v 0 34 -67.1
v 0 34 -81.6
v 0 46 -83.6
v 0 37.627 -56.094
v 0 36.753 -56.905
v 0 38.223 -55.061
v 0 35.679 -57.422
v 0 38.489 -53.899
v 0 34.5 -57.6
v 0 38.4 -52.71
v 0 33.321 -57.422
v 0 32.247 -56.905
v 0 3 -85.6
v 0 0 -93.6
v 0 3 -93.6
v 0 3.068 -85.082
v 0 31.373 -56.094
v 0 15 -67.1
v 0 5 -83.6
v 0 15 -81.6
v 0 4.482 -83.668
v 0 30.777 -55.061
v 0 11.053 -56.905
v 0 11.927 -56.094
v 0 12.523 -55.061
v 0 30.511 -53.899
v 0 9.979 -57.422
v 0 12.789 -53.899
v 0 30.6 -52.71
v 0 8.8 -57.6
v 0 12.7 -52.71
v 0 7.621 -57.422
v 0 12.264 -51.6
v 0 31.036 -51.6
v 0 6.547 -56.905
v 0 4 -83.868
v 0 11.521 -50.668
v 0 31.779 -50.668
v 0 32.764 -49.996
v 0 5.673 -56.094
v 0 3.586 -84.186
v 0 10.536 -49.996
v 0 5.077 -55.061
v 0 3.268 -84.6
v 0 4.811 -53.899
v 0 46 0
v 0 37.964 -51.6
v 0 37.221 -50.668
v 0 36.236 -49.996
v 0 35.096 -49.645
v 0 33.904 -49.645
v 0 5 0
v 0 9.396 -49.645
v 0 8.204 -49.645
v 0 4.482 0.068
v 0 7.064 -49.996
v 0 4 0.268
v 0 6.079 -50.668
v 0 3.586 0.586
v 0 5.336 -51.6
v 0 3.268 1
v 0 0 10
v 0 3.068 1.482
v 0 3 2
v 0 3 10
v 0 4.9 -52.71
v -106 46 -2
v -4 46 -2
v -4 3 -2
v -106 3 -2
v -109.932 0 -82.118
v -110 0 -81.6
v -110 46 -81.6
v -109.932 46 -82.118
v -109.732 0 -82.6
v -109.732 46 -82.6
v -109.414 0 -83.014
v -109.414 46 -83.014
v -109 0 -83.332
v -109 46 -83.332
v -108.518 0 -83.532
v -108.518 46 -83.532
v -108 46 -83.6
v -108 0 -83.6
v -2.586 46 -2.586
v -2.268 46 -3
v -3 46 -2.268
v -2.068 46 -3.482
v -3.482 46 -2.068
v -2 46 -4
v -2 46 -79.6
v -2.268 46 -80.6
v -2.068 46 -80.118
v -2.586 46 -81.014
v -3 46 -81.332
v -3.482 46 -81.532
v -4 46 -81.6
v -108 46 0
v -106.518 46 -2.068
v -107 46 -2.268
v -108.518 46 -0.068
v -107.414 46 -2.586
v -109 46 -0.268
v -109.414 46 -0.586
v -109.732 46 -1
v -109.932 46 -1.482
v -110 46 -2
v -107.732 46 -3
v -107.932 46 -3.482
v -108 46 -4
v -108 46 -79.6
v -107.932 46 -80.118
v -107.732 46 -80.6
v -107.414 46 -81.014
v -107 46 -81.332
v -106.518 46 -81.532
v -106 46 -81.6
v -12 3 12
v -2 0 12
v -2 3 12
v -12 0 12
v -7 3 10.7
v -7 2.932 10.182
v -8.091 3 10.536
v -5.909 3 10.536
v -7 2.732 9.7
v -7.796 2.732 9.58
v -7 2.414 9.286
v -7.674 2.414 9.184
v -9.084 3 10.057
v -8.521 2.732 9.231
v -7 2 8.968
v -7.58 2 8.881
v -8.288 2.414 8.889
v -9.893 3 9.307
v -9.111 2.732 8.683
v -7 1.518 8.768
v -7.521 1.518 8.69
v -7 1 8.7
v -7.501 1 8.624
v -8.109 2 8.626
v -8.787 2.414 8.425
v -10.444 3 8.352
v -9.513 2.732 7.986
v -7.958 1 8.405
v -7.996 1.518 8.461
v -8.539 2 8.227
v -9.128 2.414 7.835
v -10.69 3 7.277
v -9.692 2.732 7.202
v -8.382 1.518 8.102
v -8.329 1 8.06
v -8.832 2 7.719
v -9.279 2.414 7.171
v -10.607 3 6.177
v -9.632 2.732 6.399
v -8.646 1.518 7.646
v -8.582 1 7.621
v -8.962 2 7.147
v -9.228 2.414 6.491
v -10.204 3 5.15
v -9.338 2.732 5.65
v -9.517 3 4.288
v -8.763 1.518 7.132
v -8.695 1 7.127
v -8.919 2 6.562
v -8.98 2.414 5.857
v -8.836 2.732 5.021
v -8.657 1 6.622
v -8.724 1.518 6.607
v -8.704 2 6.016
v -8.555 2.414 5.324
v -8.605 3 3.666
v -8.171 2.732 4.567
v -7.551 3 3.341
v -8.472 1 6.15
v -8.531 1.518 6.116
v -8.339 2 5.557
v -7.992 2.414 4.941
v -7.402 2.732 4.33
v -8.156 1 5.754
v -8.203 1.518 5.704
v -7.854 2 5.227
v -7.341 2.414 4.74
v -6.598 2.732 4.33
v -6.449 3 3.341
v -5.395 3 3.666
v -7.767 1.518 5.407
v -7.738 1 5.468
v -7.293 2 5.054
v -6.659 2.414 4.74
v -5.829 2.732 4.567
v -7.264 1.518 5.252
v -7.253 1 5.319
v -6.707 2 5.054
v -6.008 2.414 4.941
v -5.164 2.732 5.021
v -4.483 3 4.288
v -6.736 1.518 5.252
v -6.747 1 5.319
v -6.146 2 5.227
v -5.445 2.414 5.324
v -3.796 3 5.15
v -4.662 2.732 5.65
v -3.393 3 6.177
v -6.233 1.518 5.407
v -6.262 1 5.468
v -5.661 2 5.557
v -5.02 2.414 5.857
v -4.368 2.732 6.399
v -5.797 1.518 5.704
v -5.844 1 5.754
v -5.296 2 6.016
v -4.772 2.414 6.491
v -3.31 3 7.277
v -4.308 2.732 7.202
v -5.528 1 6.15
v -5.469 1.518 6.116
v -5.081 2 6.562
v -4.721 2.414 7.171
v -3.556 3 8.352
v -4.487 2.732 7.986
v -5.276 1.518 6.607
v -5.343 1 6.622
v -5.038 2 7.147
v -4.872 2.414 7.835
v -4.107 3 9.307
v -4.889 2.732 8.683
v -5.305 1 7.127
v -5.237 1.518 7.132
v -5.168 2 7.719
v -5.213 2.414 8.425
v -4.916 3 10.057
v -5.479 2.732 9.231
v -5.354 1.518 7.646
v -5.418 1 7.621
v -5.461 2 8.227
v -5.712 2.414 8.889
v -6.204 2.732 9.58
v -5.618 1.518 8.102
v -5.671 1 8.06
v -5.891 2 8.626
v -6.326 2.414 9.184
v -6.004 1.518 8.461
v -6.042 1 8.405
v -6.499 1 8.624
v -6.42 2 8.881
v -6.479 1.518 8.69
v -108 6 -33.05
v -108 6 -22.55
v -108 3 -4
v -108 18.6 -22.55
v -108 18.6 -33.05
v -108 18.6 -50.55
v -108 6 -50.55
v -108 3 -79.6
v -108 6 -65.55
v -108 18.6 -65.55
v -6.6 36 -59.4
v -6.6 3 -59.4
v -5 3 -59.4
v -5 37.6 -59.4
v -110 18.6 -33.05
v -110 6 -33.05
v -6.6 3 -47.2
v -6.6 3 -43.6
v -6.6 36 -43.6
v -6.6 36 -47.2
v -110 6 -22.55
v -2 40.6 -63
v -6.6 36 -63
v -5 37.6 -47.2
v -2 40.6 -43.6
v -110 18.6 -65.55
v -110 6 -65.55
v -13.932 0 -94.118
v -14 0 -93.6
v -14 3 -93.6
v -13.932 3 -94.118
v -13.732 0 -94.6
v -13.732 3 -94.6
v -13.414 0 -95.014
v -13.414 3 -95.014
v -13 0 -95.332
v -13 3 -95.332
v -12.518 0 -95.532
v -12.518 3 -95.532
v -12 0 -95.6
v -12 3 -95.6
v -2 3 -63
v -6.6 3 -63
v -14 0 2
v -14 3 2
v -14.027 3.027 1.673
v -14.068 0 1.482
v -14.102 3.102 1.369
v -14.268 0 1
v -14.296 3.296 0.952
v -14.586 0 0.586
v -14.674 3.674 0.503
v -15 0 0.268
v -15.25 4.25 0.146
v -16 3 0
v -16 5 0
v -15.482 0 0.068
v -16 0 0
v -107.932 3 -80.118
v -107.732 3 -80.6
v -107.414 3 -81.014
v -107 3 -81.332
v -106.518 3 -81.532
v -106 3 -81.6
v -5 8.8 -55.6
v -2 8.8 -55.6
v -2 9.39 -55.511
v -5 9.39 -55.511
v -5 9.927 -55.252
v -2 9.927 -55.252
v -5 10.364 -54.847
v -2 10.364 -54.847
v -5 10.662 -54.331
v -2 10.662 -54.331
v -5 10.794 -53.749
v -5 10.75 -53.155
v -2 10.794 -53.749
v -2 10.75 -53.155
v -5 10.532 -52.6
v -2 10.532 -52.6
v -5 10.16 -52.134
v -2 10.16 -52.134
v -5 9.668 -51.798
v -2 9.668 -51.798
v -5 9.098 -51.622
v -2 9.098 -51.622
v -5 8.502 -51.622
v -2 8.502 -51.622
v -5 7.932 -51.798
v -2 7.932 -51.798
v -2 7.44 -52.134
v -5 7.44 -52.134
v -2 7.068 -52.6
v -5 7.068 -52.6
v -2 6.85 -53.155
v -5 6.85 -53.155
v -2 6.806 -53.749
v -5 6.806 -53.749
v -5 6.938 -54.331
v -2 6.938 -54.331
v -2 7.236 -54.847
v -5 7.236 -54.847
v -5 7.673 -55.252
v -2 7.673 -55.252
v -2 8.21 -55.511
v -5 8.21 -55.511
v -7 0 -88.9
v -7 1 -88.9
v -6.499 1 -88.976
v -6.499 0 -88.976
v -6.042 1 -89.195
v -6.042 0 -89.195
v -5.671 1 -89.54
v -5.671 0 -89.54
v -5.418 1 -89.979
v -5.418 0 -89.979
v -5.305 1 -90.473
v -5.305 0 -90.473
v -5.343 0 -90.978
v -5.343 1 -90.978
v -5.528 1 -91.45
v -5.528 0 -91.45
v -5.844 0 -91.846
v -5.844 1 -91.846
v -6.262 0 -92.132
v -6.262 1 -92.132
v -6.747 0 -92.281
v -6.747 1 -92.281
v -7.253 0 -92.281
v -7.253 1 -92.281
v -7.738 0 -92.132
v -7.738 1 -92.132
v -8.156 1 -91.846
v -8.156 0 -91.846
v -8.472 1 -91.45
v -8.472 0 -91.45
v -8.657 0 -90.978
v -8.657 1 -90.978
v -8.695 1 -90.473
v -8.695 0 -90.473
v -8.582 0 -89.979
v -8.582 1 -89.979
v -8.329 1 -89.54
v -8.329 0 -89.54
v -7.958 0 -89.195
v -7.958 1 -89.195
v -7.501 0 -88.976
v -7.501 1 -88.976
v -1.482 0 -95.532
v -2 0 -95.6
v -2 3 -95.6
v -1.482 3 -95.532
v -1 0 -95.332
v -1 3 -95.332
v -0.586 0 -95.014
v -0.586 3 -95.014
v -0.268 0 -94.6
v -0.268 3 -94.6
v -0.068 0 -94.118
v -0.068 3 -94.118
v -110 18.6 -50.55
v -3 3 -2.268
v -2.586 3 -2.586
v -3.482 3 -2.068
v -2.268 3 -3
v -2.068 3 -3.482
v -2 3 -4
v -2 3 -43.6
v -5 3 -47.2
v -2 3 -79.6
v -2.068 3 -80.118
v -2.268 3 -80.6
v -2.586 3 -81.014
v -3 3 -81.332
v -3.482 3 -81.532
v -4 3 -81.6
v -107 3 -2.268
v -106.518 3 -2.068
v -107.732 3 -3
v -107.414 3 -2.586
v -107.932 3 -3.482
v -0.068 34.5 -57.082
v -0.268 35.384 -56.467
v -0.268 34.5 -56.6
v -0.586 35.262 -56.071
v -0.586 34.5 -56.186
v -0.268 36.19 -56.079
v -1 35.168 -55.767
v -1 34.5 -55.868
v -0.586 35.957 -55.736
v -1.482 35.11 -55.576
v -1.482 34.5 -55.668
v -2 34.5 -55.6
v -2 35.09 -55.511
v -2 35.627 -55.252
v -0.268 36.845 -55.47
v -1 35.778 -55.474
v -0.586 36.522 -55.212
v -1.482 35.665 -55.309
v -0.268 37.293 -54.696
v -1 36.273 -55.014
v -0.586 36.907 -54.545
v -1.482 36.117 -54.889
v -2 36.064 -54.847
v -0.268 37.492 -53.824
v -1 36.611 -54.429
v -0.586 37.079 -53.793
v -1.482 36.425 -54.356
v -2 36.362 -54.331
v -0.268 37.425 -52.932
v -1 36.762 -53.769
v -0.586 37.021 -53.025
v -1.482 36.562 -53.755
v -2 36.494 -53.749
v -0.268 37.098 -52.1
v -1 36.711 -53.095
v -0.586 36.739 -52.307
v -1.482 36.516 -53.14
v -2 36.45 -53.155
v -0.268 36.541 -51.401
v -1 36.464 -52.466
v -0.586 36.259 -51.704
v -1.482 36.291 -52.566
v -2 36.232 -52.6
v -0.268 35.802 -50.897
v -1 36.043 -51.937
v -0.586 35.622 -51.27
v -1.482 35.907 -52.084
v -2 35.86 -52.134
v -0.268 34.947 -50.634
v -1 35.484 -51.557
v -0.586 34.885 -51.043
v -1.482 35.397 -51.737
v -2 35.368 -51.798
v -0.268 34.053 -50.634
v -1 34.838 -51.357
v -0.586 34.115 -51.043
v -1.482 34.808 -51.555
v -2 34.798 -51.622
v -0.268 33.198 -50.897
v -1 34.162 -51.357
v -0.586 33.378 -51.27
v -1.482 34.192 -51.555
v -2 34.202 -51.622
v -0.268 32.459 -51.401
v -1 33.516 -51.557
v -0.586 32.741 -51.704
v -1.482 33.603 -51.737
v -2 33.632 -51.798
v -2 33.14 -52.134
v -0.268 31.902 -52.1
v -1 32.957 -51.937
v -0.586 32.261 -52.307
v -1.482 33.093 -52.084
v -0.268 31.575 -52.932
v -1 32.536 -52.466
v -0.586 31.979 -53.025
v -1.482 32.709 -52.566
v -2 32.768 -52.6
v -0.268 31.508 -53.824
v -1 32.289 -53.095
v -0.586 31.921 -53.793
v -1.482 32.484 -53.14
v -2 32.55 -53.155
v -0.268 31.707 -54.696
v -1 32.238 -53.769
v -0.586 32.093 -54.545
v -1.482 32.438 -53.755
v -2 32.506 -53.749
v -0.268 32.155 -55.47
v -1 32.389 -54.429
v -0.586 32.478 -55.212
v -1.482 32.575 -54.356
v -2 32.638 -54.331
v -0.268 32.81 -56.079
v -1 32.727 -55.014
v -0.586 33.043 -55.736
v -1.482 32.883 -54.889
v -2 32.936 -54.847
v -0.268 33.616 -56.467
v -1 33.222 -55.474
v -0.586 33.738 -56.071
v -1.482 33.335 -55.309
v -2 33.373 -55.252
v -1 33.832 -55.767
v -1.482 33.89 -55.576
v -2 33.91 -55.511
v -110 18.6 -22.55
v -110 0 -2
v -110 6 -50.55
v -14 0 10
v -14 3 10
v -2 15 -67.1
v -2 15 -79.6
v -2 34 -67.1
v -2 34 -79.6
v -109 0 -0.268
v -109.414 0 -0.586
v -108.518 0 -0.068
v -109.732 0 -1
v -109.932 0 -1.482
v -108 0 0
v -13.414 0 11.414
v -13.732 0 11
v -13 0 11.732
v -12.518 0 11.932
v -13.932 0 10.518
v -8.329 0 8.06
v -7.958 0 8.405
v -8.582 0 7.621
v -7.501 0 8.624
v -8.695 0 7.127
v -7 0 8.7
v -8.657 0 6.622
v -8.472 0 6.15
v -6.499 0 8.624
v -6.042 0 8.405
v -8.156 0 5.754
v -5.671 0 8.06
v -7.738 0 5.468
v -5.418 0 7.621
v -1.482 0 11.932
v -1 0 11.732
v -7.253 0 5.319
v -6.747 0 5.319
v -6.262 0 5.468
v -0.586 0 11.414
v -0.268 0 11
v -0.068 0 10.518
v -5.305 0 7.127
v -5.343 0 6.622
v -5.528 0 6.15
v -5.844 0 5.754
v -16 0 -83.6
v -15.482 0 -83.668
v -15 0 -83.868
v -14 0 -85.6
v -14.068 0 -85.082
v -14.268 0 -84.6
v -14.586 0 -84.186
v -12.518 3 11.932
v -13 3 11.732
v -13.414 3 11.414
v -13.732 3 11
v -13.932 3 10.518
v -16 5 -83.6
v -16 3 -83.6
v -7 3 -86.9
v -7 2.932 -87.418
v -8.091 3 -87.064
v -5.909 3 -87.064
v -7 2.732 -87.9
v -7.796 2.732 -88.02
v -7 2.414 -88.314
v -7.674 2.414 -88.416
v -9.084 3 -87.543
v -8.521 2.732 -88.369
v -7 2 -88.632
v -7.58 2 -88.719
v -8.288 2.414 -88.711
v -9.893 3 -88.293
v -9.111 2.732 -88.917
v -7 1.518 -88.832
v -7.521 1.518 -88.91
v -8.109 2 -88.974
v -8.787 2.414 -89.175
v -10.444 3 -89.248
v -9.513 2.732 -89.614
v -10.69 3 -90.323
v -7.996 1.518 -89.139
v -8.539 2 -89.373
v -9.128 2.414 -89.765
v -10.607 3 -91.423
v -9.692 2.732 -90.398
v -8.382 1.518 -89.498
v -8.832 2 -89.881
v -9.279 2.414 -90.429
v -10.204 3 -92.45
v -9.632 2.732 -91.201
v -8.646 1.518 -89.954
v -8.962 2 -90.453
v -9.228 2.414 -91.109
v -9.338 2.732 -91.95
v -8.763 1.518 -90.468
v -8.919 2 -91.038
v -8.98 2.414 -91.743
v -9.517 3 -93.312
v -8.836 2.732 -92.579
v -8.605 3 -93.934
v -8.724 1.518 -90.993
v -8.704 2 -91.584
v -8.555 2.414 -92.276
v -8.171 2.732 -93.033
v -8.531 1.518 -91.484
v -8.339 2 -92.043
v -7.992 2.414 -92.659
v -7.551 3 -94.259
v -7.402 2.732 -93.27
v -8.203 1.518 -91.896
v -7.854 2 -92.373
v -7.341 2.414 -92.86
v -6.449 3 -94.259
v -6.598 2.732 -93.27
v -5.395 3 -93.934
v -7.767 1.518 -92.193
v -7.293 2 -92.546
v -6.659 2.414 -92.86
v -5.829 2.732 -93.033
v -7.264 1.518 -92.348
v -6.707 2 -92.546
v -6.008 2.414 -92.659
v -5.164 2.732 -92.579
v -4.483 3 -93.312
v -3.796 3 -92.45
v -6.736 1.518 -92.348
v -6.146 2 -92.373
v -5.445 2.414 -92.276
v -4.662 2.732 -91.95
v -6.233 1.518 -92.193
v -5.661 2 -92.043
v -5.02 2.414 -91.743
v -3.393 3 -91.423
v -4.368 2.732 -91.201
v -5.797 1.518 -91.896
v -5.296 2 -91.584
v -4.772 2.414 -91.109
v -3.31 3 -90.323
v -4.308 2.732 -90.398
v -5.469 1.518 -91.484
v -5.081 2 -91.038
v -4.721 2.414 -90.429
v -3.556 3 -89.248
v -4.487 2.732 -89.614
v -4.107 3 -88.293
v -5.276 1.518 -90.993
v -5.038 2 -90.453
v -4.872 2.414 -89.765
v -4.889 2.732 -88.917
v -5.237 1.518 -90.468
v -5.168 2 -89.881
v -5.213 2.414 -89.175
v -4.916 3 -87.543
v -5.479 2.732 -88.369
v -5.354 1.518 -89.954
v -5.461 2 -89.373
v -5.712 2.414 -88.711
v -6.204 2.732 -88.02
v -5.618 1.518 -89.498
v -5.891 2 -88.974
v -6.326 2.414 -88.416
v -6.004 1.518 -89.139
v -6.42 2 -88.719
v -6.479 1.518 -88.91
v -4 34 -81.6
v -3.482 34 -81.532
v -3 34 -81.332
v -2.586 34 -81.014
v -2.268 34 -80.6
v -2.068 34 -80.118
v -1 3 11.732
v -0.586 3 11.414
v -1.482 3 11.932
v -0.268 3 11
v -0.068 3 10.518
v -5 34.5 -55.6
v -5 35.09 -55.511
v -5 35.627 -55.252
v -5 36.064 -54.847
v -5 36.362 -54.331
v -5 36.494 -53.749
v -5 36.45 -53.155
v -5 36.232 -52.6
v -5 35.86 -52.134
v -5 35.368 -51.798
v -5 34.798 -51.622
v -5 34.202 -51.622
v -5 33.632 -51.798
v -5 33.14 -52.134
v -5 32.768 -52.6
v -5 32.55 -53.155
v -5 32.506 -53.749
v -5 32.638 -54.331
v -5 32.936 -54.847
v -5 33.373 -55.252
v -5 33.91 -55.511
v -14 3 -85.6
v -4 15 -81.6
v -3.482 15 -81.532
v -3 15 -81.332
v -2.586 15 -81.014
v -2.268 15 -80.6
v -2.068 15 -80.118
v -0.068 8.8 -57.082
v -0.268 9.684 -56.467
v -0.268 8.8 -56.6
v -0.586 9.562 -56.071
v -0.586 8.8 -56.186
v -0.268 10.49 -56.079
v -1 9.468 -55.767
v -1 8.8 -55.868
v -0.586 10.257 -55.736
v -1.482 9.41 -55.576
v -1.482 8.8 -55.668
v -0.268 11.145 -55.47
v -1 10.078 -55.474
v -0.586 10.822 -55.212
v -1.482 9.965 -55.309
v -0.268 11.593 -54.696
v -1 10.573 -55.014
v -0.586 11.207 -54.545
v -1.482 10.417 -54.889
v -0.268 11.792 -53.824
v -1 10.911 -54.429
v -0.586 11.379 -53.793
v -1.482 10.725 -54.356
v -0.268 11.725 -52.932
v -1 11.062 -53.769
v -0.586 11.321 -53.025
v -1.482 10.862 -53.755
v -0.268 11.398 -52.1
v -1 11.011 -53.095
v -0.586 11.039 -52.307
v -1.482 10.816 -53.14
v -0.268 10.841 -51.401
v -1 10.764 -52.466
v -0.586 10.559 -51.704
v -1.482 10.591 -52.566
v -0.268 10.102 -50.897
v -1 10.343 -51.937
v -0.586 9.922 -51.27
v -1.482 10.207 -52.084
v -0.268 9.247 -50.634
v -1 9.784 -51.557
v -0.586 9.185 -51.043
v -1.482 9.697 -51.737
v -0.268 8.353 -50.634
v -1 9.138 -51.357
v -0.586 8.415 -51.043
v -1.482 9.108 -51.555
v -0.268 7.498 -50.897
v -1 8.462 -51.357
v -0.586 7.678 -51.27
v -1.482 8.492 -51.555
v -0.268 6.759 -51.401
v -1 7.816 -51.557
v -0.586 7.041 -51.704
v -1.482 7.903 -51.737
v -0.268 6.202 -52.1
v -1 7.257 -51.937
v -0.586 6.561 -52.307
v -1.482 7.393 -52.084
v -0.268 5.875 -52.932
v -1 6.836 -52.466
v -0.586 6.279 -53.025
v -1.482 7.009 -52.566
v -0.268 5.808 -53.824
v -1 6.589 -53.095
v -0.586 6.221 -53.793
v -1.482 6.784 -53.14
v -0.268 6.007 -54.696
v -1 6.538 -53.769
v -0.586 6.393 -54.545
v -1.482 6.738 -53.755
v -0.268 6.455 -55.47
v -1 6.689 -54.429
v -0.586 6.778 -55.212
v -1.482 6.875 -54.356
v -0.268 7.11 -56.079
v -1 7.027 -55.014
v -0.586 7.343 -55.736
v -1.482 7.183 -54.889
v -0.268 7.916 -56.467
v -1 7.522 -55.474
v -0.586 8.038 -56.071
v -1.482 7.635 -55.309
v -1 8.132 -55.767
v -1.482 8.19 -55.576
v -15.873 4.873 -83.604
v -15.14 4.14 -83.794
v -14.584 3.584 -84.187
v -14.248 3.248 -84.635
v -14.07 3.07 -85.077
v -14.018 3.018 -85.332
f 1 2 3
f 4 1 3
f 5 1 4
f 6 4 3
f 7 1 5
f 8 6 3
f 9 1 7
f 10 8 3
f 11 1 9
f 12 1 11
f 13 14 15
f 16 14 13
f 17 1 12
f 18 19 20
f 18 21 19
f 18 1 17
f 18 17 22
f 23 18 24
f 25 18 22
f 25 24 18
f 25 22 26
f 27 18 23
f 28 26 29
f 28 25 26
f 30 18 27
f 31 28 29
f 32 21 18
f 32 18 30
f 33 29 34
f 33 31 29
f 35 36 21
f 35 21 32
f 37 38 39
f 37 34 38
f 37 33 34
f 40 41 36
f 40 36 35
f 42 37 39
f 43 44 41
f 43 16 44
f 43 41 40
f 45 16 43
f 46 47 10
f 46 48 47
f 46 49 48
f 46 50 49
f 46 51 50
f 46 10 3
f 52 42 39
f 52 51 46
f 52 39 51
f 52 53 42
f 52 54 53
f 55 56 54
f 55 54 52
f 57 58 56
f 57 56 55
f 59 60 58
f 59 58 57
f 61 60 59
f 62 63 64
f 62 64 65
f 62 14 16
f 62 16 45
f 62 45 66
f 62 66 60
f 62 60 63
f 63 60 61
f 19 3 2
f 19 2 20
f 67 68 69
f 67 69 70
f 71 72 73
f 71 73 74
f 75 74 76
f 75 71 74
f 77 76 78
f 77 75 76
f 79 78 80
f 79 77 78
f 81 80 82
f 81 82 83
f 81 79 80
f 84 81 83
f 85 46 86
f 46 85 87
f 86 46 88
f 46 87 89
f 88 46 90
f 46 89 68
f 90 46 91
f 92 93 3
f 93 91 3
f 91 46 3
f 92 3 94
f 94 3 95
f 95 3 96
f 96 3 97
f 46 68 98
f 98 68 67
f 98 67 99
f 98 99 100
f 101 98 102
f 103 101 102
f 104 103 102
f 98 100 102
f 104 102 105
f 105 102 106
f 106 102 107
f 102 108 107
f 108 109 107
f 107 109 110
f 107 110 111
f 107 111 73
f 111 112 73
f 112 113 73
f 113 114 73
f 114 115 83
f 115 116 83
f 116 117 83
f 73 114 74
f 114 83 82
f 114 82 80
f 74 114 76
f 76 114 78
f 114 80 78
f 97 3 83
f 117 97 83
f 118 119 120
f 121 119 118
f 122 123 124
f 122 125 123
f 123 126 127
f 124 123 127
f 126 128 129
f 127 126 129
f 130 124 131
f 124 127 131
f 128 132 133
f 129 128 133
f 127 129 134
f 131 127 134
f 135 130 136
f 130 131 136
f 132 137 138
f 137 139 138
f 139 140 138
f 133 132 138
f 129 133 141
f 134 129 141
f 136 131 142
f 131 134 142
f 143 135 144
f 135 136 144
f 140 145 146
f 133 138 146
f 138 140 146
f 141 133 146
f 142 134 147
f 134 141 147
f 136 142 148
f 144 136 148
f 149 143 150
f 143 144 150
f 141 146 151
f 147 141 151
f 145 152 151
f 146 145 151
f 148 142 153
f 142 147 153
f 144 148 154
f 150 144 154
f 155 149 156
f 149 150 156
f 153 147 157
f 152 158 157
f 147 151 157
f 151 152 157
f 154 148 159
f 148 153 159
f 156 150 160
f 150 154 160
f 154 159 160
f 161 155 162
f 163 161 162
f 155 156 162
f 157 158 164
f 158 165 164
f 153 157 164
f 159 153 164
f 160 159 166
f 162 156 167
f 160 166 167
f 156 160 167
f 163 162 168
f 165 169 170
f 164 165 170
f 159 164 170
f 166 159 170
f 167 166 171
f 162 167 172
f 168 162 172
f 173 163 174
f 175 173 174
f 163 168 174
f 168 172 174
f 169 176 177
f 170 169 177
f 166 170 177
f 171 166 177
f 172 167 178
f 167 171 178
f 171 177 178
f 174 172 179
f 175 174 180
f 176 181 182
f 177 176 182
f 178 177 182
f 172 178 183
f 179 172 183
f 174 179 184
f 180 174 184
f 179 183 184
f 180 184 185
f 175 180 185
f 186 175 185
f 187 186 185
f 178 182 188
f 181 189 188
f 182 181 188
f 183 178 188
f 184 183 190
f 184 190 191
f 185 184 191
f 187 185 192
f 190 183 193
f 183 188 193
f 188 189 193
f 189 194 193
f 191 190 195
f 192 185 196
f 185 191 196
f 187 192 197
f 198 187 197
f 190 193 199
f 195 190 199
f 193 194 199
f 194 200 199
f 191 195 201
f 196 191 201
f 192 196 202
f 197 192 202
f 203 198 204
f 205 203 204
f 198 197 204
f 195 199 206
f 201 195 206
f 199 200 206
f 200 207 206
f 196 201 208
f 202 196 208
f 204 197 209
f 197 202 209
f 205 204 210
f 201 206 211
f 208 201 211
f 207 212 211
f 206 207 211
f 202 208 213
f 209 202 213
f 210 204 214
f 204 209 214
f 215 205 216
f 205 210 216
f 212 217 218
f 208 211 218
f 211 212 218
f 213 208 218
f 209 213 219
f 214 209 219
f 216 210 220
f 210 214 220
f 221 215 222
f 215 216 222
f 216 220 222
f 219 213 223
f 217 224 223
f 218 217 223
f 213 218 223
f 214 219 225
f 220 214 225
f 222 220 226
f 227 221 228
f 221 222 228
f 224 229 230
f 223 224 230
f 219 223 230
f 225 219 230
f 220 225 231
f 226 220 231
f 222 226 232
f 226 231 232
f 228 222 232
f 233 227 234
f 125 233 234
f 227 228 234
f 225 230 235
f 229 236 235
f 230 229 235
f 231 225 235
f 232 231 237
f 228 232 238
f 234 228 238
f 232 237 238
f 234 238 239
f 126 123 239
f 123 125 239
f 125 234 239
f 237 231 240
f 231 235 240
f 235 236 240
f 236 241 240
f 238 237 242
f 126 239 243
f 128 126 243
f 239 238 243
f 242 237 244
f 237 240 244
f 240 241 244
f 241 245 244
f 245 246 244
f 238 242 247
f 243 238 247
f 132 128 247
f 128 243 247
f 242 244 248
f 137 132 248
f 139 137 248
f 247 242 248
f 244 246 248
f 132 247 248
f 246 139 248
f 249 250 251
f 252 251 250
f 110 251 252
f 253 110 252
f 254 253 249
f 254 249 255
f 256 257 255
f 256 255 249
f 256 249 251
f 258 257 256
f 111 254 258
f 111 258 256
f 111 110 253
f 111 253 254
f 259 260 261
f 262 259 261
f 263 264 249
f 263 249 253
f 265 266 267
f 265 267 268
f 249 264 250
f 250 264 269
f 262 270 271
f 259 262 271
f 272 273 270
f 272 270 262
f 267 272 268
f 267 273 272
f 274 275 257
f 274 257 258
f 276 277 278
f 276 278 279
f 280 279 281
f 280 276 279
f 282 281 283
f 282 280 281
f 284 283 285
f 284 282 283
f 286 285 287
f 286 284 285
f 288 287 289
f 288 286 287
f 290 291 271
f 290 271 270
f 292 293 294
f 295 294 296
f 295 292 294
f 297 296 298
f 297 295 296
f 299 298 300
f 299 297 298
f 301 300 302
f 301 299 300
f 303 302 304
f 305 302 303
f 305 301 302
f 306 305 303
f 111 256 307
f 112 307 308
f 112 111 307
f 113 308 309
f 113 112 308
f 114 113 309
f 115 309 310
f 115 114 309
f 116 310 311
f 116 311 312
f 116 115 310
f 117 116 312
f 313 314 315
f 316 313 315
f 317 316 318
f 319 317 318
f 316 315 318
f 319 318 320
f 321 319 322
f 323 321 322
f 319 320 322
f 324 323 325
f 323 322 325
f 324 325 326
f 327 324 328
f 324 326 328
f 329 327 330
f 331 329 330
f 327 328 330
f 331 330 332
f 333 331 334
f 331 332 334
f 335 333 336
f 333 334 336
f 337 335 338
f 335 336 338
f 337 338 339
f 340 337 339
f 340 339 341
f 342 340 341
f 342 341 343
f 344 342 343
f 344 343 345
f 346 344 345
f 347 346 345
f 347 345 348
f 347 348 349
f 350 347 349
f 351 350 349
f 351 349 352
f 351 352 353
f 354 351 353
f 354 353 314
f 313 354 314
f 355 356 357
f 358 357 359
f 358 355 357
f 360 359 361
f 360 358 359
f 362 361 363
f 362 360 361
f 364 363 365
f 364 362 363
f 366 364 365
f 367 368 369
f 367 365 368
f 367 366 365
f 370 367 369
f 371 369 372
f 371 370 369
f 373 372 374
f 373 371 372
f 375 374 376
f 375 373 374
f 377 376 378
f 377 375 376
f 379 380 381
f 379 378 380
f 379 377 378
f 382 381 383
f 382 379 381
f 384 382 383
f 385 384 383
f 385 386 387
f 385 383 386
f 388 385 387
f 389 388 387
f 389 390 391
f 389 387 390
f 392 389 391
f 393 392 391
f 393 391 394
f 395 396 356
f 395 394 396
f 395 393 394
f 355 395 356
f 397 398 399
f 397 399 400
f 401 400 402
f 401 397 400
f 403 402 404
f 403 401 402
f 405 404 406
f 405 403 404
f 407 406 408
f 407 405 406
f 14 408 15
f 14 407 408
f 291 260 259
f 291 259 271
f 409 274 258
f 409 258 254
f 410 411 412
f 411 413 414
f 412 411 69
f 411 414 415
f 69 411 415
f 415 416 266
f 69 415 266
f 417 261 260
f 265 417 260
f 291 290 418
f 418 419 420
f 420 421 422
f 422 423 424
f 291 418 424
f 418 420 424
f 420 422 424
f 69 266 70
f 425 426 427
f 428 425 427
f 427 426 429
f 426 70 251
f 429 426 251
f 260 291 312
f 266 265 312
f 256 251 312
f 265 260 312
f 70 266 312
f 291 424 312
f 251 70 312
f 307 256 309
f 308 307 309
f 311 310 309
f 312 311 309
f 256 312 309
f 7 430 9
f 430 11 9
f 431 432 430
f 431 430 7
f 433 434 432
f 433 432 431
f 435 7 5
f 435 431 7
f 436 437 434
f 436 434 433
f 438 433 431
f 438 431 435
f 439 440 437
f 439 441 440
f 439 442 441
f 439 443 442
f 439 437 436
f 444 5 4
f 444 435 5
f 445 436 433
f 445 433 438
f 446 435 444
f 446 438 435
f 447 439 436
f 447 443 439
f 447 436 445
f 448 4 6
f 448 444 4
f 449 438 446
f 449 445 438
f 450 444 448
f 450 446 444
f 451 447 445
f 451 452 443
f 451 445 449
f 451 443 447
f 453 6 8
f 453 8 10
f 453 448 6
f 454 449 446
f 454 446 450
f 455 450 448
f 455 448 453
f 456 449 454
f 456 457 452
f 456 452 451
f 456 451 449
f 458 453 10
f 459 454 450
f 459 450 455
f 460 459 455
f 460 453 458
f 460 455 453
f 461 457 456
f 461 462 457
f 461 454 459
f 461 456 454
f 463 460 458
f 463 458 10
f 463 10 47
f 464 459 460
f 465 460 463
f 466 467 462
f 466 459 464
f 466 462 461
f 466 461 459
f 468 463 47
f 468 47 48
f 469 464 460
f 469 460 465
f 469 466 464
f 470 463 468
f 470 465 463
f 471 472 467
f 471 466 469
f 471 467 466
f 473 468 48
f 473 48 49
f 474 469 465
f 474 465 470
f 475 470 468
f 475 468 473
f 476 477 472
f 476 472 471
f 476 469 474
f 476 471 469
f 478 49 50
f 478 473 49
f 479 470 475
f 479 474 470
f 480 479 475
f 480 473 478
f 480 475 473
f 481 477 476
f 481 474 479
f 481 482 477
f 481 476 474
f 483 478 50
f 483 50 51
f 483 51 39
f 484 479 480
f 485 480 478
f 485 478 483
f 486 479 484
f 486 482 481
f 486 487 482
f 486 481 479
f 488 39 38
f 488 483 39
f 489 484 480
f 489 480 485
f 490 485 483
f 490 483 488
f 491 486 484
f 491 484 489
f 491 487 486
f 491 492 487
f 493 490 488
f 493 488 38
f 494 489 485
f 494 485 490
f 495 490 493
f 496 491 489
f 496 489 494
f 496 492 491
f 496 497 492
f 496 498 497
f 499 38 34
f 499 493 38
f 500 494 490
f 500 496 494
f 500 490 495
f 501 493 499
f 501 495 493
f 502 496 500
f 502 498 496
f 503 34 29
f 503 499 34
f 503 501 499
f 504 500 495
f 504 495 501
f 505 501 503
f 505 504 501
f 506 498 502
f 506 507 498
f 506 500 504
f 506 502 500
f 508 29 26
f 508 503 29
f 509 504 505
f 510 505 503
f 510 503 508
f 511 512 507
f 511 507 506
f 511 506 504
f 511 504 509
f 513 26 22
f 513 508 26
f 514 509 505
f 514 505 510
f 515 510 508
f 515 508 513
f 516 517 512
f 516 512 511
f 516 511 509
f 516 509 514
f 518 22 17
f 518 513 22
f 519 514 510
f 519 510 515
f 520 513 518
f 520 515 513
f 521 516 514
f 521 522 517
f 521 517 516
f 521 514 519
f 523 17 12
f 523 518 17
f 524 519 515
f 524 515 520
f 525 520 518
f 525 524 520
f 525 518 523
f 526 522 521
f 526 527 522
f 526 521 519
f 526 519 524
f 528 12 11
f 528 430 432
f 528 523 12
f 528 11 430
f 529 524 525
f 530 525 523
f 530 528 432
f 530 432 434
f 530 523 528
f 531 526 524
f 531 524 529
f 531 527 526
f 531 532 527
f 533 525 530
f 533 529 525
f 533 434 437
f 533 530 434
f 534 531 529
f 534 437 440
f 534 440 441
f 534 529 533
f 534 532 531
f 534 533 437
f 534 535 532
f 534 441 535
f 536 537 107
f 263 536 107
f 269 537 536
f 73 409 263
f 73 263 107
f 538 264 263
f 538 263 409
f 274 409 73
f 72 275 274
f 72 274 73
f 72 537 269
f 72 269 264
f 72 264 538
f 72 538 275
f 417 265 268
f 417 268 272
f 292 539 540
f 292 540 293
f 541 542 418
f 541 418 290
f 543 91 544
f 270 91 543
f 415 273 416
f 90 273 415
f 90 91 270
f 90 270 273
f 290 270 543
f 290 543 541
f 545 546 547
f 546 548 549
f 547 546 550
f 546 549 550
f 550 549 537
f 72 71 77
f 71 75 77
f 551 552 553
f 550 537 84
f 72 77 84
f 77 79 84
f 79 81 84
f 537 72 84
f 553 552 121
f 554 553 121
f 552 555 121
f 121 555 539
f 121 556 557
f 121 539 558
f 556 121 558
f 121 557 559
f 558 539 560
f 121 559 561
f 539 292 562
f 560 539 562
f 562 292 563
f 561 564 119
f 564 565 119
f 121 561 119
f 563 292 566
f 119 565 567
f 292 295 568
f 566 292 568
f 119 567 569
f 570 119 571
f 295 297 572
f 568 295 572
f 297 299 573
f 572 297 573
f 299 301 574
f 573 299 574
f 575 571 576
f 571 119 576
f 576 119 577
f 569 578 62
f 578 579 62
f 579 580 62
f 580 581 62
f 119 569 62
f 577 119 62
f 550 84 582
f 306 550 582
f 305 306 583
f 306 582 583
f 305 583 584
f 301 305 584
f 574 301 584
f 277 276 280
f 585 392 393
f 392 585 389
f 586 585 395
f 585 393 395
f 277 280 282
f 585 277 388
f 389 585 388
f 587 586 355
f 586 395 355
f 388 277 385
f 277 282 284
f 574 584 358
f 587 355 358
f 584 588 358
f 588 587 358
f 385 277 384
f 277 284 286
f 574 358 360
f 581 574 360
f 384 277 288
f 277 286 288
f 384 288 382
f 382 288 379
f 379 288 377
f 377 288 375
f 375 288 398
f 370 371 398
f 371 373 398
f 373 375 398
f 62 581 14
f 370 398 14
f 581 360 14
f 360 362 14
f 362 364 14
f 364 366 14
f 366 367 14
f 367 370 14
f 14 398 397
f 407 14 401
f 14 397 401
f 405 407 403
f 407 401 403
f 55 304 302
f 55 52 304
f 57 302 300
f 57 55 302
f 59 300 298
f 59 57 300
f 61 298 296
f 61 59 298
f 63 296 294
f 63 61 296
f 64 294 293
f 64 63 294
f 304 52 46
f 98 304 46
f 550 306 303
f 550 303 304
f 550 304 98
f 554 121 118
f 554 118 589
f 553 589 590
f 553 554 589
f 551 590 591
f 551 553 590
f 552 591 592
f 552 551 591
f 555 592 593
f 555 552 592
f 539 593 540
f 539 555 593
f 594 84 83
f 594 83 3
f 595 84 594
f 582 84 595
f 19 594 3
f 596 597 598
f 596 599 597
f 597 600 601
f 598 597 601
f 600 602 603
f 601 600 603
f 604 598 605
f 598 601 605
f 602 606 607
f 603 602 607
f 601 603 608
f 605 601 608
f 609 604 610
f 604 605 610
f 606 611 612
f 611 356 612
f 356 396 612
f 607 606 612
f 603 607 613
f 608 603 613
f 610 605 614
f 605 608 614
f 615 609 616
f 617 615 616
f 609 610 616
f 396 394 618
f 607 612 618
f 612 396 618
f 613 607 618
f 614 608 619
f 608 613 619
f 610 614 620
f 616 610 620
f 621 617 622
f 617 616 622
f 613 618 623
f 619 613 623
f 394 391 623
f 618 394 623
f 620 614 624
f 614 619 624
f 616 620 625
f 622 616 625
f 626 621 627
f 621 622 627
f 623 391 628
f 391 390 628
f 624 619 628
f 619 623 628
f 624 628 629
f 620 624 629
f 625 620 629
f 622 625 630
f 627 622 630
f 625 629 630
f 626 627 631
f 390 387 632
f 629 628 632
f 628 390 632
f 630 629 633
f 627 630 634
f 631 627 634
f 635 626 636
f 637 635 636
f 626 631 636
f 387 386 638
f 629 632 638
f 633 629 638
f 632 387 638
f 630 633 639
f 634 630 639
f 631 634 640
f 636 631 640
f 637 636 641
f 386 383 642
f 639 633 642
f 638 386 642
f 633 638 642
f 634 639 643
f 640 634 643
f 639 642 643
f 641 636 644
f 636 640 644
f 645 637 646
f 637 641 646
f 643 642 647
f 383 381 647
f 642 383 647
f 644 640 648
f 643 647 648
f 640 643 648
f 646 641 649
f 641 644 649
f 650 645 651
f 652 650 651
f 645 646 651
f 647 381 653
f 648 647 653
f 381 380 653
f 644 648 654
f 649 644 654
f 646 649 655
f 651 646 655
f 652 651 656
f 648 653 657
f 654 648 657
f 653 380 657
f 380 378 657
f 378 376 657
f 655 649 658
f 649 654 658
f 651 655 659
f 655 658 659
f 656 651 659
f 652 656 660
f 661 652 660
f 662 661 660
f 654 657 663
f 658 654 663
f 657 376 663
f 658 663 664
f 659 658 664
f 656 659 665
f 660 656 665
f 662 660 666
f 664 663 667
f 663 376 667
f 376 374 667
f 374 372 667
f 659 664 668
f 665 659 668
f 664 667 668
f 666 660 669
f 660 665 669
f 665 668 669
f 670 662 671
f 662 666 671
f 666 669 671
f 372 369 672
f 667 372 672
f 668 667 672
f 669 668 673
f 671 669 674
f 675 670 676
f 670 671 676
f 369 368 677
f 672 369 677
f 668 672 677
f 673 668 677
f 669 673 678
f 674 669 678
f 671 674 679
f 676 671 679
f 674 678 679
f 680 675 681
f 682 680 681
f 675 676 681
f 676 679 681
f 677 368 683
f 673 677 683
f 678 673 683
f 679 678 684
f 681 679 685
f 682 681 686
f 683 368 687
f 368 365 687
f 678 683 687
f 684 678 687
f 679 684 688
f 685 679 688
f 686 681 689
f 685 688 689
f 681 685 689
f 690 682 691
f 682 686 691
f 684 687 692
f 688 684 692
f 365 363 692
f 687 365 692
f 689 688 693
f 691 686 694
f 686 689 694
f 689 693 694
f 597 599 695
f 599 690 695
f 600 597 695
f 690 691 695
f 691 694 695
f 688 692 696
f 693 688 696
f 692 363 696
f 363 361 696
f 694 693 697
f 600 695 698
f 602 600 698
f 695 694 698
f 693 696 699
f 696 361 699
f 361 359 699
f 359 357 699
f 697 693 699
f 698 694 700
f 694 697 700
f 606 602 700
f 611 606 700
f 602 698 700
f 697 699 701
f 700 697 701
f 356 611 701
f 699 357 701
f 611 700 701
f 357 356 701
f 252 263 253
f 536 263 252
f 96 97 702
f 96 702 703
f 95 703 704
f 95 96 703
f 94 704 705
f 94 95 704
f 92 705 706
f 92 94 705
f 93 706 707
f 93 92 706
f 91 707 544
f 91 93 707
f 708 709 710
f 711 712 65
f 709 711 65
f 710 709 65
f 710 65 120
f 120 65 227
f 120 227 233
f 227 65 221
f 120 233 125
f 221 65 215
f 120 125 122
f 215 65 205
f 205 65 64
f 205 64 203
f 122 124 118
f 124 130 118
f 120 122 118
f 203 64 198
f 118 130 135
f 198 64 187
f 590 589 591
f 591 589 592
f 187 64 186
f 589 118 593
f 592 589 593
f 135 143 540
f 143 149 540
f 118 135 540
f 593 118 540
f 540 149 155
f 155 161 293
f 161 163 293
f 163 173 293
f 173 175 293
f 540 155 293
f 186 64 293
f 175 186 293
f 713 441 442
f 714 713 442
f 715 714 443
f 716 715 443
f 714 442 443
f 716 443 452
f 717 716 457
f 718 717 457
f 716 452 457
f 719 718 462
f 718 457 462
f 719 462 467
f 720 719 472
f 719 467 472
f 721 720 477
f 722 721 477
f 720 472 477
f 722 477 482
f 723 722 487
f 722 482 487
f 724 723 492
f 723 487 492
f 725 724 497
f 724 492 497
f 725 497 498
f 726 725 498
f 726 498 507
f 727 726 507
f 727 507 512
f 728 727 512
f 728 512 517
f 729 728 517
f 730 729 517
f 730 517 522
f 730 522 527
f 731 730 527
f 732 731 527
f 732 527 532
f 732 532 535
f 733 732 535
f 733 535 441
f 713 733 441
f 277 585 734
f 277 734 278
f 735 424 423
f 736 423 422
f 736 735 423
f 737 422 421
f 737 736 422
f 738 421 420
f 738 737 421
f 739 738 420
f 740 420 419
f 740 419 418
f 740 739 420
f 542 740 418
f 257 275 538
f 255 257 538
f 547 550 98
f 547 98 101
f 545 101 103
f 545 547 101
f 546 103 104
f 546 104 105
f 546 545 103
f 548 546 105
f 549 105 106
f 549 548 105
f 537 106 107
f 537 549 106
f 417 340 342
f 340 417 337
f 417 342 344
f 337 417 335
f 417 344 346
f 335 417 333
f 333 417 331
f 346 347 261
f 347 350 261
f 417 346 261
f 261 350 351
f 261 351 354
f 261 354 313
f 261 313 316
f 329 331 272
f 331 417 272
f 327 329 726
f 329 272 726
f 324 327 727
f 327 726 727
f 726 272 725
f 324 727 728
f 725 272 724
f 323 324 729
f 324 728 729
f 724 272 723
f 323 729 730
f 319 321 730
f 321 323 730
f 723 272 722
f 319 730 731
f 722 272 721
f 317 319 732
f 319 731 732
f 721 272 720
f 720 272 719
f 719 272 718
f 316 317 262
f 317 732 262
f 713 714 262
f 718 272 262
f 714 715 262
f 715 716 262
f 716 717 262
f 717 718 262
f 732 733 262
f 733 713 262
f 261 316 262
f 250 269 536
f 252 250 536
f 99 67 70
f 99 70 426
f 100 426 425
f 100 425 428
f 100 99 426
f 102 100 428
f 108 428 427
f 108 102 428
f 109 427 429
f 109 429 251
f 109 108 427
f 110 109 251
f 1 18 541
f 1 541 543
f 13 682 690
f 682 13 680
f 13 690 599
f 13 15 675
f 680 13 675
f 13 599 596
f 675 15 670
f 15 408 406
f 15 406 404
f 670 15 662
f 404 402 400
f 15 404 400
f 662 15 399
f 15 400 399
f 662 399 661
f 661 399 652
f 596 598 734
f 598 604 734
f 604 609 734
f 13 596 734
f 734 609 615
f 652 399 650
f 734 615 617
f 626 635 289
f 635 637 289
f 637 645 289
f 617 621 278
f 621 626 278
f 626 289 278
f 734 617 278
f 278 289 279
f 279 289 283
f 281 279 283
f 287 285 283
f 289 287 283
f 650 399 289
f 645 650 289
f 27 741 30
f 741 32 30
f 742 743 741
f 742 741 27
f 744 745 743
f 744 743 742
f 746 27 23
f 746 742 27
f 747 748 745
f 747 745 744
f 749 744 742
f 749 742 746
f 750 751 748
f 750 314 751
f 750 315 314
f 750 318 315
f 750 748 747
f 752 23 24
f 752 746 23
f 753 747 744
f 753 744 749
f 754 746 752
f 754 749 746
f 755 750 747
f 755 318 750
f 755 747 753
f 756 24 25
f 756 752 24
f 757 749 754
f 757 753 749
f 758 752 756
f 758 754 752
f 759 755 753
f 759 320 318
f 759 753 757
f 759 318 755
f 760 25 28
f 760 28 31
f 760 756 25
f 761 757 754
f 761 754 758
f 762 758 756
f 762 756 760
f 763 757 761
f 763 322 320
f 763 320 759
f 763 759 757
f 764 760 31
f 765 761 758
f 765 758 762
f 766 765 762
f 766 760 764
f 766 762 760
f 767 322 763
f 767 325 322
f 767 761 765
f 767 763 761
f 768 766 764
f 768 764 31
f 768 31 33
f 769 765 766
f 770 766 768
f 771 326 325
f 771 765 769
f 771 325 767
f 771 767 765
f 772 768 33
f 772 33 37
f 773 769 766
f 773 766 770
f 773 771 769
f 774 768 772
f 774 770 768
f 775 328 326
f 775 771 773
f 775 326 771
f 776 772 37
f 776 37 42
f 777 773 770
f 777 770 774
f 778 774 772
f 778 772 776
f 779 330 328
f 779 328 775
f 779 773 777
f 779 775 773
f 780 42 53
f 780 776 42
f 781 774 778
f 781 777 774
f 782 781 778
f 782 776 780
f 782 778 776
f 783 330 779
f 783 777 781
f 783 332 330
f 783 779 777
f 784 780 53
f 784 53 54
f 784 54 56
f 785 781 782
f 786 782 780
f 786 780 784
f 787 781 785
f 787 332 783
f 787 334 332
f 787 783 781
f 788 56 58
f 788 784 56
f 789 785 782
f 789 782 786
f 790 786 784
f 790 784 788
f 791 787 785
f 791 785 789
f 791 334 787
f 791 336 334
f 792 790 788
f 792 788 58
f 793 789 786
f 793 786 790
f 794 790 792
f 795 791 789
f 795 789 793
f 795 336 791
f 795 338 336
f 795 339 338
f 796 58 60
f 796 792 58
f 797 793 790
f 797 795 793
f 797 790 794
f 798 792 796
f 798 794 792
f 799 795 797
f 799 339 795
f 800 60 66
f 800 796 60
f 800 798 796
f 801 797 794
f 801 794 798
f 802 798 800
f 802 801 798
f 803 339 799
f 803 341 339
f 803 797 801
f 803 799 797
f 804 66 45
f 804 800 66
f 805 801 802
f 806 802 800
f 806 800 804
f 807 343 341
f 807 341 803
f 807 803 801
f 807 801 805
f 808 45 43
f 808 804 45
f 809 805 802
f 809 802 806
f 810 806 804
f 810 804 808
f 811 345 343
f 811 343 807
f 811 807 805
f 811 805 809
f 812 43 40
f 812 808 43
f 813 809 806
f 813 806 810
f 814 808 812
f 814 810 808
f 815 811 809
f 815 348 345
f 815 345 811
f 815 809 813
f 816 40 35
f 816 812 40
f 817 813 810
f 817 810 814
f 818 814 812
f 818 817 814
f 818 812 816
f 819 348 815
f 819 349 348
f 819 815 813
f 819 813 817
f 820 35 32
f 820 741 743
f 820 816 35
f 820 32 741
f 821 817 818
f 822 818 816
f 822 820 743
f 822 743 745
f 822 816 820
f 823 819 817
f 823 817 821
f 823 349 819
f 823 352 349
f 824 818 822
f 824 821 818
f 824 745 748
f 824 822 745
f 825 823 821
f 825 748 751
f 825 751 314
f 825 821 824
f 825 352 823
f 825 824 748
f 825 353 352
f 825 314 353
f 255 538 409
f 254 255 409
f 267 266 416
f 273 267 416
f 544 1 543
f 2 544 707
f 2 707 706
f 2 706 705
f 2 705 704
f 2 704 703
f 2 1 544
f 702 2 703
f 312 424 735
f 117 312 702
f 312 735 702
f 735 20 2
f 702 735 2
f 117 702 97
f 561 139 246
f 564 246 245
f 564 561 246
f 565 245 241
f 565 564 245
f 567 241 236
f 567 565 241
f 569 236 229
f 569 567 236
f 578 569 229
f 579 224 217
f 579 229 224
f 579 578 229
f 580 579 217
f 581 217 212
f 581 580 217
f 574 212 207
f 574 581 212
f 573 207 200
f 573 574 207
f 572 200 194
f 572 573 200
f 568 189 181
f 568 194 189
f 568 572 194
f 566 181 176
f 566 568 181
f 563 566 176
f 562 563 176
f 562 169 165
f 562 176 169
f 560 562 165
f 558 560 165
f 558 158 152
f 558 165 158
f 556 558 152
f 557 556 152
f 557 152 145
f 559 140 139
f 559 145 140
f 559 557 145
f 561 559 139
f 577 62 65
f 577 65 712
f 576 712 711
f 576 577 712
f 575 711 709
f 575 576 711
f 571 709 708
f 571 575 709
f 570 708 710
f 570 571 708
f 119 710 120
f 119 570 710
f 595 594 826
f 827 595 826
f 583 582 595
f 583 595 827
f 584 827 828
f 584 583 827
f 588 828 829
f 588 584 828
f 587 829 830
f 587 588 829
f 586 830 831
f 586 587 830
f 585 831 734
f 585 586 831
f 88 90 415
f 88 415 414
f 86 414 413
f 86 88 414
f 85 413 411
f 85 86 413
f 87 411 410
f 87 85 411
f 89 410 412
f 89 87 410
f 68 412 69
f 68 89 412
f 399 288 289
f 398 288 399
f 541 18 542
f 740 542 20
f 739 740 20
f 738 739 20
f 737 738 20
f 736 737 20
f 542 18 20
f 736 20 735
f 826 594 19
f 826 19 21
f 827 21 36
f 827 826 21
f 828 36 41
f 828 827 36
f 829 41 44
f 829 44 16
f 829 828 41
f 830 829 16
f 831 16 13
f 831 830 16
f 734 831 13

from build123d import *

# Parameters (mm, degrees)
BOSS_EXTRUDE1_DEPTH = 46
BOSS_EXTRUDE2_DEPTH = 3
BOSS_EXTRUDE3_DEPTH = 3
FILLET1_R           = 2
FILLET2_R           = 2
CUT_EXTRUDE5_REACH  = 154.825
SKETCH3_R           = 1.7
FILLET3_R           = 2
CUT_EXTRUDE6_DEPTH  = 43
SKETCH5_W           = 4.6
SKETCH5_H           = 19.4
BOSS_EXTRUDE4_DEPTH = 46
SKETCH6_W           = 4.6
SKETCH6_H           = 19.4
CUT_EXTRUDE8_DEPTH  = 5
SKETCH7_W           = 1.6
SKETCH7_H           = 12.2
CUT_EXTRUDE10_DEPTH = 38
CHAMFER1_SIZE       = 5
SKETCH8_R           = 2
CUT_EXTRUDE11_DEPTH = 34.5
FILLET4_R           = 2
SKETCH12_W          = 15
SKETCH12_H          = 12.6
SKETCH12_W_2        = 10.5
CUT_EXTRUDE13_DEPTH = 34.5
SKETCH14_W          = 14.5
SKETCH14_H          = 19
CUT_EXTRUDE14_DEPTH = 10


with BuildPart() as part:
    # Sketch2 → Boss-Extrude1 (new body)
    with BuildSketch(Plane(origin=(0, 0, 0), x_dir=(1, 0, 0), z_dir=(0, 1, 0))):
        with BuildLine():
            ThreePointArc((-110, 81.6), (-109.414213562, 83.014213562), (-108, 83.6))
            Line((-108, 83.6), (-16, 83.6))
            Line((-16, 83.6), (0, 83.6))
            Line((0, 83.6), (0, 0))
            Line((0, 0), (-16, 0))
            Line((-16, 0), (-108, 0))
            ThreePointArc((-108, 0), (-109.414213562, 0.585786438), (-110, 2))
            Line((-110, 2), (-110, 81.6))
        make_face()
    extrude(amount=BOSS_EXTRUDE1_DEPTH)

    # Sketch2<7> → Boss-Extrude2 (add)
    with BuildSketch(Plane(origin=(0, 0, 0), x_dir=(1, 0, 0), z_dir=(0, 1, 0))):
        with BuildLine():
            ThreePointArc((-16, 83.6), (-14.585786438, 84.185786438), (-14, 85.6))
            Line((-14, 85.6), (-14, 93.6))
            ThreePointArc((-14, 93.6), (-13.414213562, 95.014213562), (-12, 95.6))
            Line((-12, 95.6), (-2, 95.6))
            ThreePointArc((-2, 95.6), (-0.585786438, 95.014213562), (0, 93.6))
            Line((0, 93.6), (0, 83.6))
            Line((0, 83.6), (-16, 83.6))
        make_face()
    extrude(amount=BOSS_EXTRUDE2_DEPTH)

    # Sketch2<8> → Boss-Extrude3 (add)
    with BuildSketch(Plane(origin=(0, 0, 0), x_dir=(1, 0, 0), z_dir=(0, 1, 0))):
        with BuildLine():
            ThreePointArc((0, -10), (-0.585786438, -11.414213562), (-2, -12))
            Line((-2, -12), (-12, -12))
            ThreePointArc((-12, -12), (-13.414213562, -11.414213562), (-14, -10))
            Line((-14, -10), (-14, -2))
            ThreePointArc((-14, -2), (-14.585786438, -0.585786438), (-16, 0))
            Line((-16, 0), (0, 0))
            Line((0, 0), (0, -10))
        make_face()
    extrude(amount=BOSS_EXTRUDE3_DEPTH)

    # Fillet1
    fillet1_edges = [part.edges().sort_by_distance(p)[0] for p in [
        (-8, 3, -83.6),
    ]]
    fillet(fillet1_edges, radius=FILLET1_R)

    # Fillet2
    fillet2_edges = [part.edges().sort_by_distance(p)[0] for p in [
        (-8, 3, 0),
    ]]
    fillet(fillet2_edges, radius=FILLET2_R)

    # Sketch3 → Cut-Extrude5 (cut, up to next)
    with BuildSketch(Plane(origin=(0, 0, 0), x_dir=(1, 0, 0), z_dir=(0, 1, 0)), mode=Mode.PRIVATE) as cut_extrude5_sk1:
        with Locations(Location((-7, -7, 0), (0, 0, 270))):
            Circle(SKETCH3_R)
    cut_extrude5_tool1 = extrude(cut_extrude5_sk1.sketch, amount=CUT_EXTRUDE5_REACH, mode=Mode.PRIVATE) & part.part
    # Sketch3 → Cut-Extrude5 (cut, up to next)
    with BuildSketch(Plane(origin=(0, 0, 0), x_dir=(1, 0, 0), z_dir=(0, 1, 0)), mode=Mode.PRIVATE) as cut_extrude5_sk2:
        with Locations(Location((-7, 90.6, 0), (0, 0, 270))):
            Circle(SKETCH3_R)
    cut_extrude5_tool2 = extrude(cut_extrude5_sk2.sketch, amount=CUT_EXTRUDE5_REACH, mode=Mode.PRIVATE) & part.part
    add(cut_extrude5_tool1.solids().sort_by_distance((-7, 0, 7))[0], mode=Mode.SUBTRACT)
    add(cut_extrude5_tool2.solids().sort_by_distance((-7, 0, -90.6))[0], mode=Mode.SUBTRACT)

    # Fillet3
    fillet3_edges = [part.edges().sort_by_distance(p)[0] for p in [
        (-7, 3, -92.3),
        (-7, 3, 5.3),
    ]]
    fillet(fillet3_edges, radius=FILLET3_R)

    # Sketch4 → Cut-Extrude6 (cut)
    with BuildSketch(Plane(origin=(0, 46, 0), x_dir=(1, 0, 0), z_dir=(0, 1, 0))):
        with BuildLine():
            Line((-106, 81.6), (-4, 81.6))
            ThreePointArc((-4, 81.6), (-2.585786438, 81.014213562), (-2, 79.6))
            Line((-2, 79.6), (-2, 4))
            ThreePointArc((-2, 4), (-2.585786438, 2.585786438), (-4, 2))
            Line((-4, 2), (-106, 2))
            ThreePointArc((-106, 2), (-107.414213562, 2.585786438), (-108, 4))
            Line((-108, 4), (-108, 79.6))
            ThreePointArc((-108, 79.6), (-107.414213562, 81.014213562), (-106, 81.6))
        make_face()
    extrude(amount=-CUT_EXTRUDE6_DEPTH, mode=Mode.SUBTRACT)

    # Sketch5 → Boss-Extrude4 (add)
    with BuildSketch(Plane(origin=(0, 0, 0), x_dir=(1, 0, 0), z_dir=(0, 1, 0))):
        with Locations((-4.3, 53.3)):
            Rectangle(SKETCH5_W, SKETCH5_H)
    extrude(amount=BOSS_EXTRUDE4_DEPTH)

    # Sketch6 → Cut-Extrude8 (cut)
    with BuildSketch(Plane(origin=(0, 46, 0), x_dir=(1, 0, 0), z_dir=(0, 1, 0))):
        with Locations((-4.3, 53.3)):
            Rectangle(SKETCH6_W, SKETCH6_H)
    extrude(amount=-CUT_EXTRUDE8_DEPTH, mode=Mode.SUBTRACT)

    # Sketch7 → Cut-Extrude10 (cut)
    with BuildSketch(Plane(origin=(0, 41, 0), x_dir=(1, 0, 0), z_dir=(0, 1, 0))):
        with Locations((-5.8, 53.3)):
            Rectangle(SKETCH7_W, SKETCH7_H)
    extrude(amount=-CUT_EXTRUDE10_DEPTH, mode=Mode.SUBTRACT)

    # Chamfer1
    # the kernel refuses this chamfer: 5 mm, written as the material it takes off along each edge
    with BuildSketch(Plane(origin=(-6.6, 41, -46.54158506), x_dir=(0.9996219169112968, 0.027495876610586317, 0), z_dir=(0, 0, -1))) as chamfer1_piece_1_section:
        Polygon((CHAMFER1_SIZE * 0.999621916911, CHAMFER1_SIZE * 0.0274958766106), (-CHAMFER1_SIZE * 0.0274958766106, CHAMFER1_SIZE * 0.999621916911), (0, 0), align=None)
    chamfer1_piece_1 = extrude(amount=29.31682988, mode=Mode.PRIVATE)
    chamfer1_piece_1 = split(chamfer1_piece_1, bisect_by=Plane(origin=(-2, 39.327890325, -61.2), z_dir=(-1, 0, 0)), keep=Keep.TOP, mode=Mode.PRIVATE)
    add(chamfer1_piece_1, mode=Mode.SUBTRACT)
    with BuildSketch(Plane(origin=(-6.6, 41, -30.74158506), x_dir=(0.9996219169112968, 0.027495876610586317, 0), z_dir=(0, 0, -1))) as chamfer1_piece_2_section:
        Polygon((CHAMFER1_SIZE * 0.999621916911, CHAMFER1_SIZE * 0.0274958766106), (-CHAMFER1_SIZE * 0.0274958766106, CHAMFER1_SIZE * 0.999621916911), (0, 0), align=None)
    chamfer1_piece_2 = extrude(amount=29.31682988, mode=Mode.PRIVATE)
    chamfer1_piece_2 = split(chamfer1_piece_2, bisect_by=Plane(origin=(-2, 39.327890325, -45.4), z_dir=(-1, 0, 0)), keep=Keep.TOP, mode=Mode.PRIVATE)
    add(chamfer1_piece_2, mode=Mode.SUBTRACT)

    # Sketch8 → Cut-Extrude11 (cut)
    with BuildSketch(Plane(origin=(0, 0, 0), x_dir=(0, 0, -1), z_dir=(1, 0, 0))):
        with Locations((53.6, 8.8)):
            Circle(SKETCH8_R)
        with Locations((53.6, 34.5)):
            Circle(SKETCH8_R)
    extrude(amount=-CUT_EXTRUDE11_DEPTH, mode=Mode.SUBTRACT)

    # Fillet4
    fillet4_edges = [part.edges().sort_by_distance(p)[0] for p in [
        (0, 8.8, -51.6),
        (0, 34.5, -51.6),
    ]]
    fillet(fillet4_edges, radius=FILLET4_R)

    # Sketch12 → Cut-Extrude13 (cut)
    with BuildSketch(Plane.ZY.offset(110)):
        with Locations((-58.05, 12.3)):
            Rectangle(SKETCH12_W, SKETCH12_H)
        with Locations((-27.8, 12.3)):
            Rectangle(SKETCH12_W_2, SKETCH12_H)
    extrude(amount=-CUT_EXTRUDE13_DEPTH, mode=Mode.SUBTRACT)

    # Sketch14 → Cut-Extrude14 (cut)
    with BuildSketch(Plane(origin=(0, 0, 0), x_dir=(0, 0, -1), z_dir=(1, 0, 0))):
        with Locations((74.35, 24.5)):
            Rectangle(SKETCH14_W, SKETCH14_H)
    extrude(amount=-CUT_EXTRUDE14_DEPTH, mode=Mode.SUBTRACT)


solid = part.part
